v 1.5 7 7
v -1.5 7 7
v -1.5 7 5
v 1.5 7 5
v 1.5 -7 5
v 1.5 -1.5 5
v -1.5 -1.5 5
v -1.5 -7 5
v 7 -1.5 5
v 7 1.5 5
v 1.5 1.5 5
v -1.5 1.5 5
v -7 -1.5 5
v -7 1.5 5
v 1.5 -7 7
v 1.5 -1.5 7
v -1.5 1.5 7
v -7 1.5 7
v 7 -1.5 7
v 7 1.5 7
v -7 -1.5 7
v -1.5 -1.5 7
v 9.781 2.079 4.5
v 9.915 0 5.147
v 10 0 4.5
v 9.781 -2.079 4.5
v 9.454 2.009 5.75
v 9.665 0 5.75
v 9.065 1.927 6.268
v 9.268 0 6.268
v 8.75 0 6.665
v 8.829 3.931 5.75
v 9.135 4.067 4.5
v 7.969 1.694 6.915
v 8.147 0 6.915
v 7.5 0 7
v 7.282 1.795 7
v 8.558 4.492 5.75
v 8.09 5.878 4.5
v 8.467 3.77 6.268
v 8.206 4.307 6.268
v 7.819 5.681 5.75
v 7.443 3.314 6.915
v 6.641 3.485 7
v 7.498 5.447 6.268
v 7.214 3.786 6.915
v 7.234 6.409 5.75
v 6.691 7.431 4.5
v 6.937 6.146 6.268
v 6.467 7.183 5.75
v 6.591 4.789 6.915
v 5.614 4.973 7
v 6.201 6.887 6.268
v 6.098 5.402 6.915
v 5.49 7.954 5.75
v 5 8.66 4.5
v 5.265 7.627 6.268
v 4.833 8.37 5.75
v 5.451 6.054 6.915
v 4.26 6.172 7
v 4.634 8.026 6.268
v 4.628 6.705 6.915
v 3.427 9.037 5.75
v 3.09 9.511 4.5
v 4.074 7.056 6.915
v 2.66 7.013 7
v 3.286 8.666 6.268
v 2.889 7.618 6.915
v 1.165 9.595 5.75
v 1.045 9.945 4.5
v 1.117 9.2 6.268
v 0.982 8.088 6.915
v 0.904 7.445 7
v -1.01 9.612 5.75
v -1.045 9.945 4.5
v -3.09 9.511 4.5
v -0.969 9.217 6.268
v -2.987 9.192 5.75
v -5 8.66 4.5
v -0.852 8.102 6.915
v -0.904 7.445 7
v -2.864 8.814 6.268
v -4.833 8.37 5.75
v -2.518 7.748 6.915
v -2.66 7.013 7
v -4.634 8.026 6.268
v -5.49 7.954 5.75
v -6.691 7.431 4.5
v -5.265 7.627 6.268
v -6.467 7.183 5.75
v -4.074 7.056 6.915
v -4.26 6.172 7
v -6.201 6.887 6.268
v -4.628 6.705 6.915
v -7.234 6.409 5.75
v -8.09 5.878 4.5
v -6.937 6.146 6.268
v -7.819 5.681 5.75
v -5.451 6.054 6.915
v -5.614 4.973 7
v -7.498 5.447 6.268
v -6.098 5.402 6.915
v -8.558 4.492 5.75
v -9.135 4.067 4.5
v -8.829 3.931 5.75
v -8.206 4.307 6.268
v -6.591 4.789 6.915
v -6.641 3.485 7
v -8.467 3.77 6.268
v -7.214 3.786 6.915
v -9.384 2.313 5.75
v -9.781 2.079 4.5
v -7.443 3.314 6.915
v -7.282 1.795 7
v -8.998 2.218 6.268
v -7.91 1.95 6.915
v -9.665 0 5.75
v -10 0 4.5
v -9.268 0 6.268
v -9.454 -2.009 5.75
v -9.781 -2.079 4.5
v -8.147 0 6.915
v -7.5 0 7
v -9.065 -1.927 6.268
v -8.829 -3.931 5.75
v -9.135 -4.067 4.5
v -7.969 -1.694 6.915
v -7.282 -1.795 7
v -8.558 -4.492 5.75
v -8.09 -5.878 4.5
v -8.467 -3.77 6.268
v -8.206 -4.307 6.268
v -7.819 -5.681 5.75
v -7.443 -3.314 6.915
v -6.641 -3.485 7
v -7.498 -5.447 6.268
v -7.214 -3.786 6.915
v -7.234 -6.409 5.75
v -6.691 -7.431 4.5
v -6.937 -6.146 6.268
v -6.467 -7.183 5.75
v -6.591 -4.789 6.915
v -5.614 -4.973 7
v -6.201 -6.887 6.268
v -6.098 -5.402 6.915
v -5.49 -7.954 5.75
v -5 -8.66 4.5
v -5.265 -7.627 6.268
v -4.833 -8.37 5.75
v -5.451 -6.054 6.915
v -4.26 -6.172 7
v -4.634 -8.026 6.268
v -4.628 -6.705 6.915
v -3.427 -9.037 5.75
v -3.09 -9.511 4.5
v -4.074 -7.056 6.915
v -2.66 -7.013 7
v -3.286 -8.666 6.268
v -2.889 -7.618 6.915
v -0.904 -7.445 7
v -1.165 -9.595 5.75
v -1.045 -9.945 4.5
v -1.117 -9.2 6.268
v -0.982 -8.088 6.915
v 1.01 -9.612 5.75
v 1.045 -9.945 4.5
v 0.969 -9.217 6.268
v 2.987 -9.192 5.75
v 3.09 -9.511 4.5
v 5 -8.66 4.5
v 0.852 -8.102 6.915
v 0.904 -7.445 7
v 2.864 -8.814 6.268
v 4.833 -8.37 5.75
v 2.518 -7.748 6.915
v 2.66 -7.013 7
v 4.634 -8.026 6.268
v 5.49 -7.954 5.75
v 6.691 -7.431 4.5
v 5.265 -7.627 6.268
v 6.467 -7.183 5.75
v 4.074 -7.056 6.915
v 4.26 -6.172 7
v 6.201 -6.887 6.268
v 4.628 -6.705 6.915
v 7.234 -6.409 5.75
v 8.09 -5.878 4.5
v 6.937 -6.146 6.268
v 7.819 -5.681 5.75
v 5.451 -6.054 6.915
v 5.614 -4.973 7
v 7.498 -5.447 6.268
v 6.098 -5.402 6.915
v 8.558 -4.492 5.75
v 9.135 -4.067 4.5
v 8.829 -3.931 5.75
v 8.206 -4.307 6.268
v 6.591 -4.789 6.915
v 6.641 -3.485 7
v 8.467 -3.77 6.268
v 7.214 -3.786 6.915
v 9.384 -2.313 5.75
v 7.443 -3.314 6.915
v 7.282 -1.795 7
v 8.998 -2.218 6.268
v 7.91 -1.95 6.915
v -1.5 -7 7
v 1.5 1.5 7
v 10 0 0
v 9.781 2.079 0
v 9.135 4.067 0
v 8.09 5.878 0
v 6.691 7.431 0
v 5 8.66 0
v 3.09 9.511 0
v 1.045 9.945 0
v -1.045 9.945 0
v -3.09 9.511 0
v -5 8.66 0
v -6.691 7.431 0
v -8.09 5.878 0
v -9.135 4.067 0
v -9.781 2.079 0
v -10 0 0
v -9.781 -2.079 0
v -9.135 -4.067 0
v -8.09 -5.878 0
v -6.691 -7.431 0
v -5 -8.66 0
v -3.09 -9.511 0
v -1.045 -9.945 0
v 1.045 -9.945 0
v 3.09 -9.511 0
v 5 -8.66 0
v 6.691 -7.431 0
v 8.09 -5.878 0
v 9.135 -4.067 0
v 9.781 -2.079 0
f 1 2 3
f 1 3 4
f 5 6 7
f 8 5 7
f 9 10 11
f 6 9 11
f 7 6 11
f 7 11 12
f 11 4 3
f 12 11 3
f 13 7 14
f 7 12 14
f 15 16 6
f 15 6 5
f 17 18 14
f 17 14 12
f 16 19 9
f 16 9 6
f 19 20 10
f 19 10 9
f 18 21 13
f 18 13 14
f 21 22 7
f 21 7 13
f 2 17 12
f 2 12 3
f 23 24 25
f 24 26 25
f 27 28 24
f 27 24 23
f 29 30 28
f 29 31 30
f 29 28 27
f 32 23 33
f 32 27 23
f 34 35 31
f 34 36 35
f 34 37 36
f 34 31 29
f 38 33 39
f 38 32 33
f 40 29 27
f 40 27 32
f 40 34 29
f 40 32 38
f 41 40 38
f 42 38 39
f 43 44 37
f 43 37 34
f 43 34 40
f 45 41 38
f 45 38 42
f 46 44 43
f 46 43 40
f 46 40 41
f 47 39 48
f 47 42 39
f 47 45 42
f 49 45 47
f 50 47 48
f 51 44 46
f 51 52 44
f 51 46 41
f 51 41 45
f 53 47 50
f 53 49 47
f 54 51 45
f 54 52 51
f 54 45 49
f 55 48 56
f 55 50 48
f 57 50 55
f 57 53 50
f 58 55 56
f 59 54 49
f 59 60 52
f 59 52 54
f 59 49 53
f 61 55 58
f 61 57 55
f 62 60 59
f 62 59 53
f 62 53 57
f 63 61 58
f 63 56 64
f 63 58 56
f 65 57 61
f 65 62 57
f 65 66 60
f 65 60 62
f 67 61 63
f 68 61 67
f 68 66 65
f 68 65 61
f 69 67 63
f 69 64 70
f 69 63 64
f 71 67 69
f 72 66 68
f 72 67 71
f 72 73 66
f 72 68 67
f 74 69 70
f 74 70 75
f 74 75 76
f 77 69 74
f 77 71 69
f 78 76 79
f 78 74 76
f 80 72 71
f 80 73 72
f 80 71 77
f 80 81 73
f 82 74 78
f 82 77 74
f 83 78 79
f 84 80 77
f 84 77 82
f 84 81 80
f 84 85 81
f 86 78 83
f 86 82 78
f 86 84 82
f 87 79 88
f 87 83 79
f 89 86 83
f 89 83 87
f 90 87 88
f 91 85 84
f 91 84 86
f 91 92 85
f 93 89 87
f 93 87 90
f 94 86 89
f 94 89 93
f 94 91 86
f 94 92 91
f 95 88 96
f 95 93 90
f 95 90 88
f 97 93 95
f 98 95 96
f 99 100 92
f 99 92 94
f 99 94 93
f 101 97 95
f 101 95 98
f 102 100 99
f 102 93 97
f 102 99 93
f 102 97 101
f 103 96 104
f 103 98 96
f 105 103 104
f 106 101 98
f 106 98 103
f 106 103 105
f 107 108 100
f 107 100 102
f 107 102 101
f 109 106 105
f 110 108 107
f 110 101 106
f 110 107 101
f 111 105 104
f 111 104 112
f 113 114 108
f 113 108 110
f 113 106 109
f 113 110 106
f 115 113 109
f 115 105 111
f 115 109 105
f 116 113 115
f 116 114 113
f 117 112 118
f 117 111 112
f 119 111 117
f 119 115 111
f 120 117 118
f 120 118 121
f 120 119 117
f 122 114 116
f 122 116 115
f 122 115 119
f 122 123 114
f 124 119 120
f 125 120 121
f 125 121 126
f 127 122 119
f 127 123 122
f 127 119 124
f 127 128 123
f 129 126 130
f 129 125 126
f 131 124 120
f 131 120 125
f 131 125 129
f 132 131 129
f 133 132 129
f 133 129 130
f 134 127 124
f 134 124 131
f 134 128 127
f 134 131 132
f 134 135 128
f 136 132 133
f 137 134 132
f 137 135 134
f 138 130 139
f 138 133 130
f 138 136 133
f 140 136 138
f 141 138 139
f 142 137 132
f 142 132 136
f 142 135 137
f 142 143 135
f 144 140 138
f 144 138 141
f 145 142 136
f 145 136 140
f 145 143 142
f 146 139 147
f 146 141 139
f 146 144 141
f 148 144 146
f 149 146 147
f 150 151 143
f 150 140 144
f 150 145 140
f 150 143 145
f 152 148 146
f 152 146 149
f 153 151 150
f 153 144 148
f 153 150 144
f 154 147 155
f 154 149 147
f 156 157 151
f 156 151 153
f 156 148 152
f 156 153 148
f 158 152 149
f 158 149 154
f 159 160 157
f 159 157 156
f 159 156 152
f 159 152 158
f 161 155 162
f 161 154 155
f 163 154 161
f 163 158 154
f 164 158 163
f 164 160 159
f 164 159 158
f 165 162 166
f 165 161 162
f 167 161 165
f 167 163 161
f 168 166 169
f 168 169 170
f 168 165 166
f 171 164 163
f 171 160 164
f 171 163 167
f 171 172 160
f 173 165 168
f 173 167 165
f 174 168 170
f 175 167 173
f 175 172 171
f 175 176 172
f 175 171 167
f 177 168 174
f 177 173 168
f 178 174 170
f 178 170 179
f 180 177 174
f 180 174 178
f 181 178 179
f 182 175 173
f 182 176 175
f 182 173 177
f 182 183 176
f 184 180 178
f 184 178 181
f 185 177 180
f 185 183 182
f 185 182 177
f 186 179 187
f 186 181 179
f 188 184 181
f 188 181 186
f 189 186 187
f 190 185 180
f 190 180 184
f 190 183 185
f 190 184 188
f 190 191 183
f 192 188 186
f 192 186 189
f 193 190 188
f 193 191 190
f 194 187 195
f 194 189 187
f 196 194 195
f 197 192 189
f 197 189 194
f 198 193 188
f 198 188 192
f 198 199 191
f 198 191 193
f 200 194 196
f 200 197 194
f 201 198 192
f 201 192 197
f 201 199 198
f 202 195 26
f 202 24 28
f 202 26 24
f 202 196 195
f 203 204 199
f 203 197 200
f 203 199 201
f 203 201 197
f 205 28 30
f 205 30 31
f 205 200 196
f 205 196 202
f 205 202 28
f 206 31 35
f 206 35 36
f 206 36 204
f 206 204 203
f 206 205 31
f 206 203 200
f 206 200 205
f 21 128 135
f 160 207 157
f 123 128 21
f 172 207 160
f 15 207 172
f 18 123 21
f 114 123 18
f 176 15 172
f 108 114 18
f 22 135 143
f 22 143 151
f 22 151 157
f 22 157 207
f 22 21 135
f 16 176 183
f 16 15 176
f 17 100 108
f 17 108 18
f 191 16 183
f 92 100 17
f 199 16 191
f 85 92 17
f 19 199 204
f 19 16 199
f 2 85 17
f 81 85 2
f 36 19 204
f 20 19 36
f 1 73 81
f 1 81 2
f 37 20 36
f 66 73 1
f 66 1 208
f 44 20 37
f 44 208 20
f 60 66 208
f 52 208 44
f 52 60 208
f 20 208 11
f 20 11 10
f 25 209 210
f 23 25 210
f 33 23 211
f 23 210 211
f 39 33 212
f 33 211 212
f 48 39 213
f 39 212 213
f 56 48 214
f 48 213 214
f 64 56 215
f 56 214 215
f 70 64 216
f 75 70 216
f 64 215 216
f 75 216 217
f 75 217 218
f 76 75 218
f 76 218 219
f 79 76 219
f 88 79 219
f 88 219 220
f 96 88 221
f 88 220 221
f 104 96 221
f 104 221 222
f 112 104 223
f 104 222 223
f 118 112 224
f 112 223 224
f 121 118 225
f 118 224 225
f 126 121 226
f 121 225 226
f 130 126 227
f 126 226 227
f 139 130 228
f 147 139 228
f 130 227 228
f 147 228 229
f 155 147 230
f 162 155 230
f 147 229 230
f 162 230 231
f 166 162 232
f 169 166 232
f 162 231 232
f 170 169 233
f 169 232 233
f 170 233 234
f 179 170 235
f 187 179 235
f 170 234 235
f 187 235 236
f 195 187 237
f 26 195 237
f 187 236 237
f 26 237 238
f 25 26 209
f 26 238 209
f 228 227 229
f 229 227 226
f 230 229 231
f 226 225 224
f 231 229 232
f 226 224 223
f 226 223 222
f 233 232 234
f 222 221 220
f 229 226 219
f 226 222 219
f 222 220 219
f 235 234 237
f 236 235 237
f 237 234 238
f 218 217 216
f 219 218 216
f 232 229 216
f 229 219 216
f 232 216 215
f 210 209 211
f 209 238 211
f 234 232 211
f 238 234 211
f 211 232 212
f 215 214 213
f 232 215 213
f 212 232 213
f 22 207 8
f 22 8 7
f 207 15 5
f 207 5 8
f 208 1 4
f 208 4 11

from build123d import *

# Parameters (mm, degrees)
SKETCH002_R  = 10
PAD001_DEPTH = 7
POCKET_DEPTH = 2
FILLET_R     = 2.5


with BuildPart() as part:
    # Sketch002 → Pad001 (new body)
    with BuildSketch(Plane.XY):
        Circle(SKETCH002_R)
    extrude(amount=PAD001_DEPTH)

    # Sketch003 → Pocket (cut)
    with BuildSketch(Plane.XY.offset(7)):
        Polygon((-1.5, 7), (1.5, 7), (1.5, 1.5), (7, 1.5), (7, -1.5), (1.5, -1.5), (1.5, -7), (-1.5, -7), (-1.5, -1.5), (-7, -1.5), (-7, 1.5), (-1.5, 1.5), align=None)
    extrude(amount=-POCKET_DEPTH, mode=Mode.SUBTRACT)

    # Fillet
    fillet_edges = [part.edges().sort_by_distance(p)[0] for p in [
        (-10, 0, 7),
    ]]
    fillet(fillet_edges, radius=FILLET_R)


solid = part.part
